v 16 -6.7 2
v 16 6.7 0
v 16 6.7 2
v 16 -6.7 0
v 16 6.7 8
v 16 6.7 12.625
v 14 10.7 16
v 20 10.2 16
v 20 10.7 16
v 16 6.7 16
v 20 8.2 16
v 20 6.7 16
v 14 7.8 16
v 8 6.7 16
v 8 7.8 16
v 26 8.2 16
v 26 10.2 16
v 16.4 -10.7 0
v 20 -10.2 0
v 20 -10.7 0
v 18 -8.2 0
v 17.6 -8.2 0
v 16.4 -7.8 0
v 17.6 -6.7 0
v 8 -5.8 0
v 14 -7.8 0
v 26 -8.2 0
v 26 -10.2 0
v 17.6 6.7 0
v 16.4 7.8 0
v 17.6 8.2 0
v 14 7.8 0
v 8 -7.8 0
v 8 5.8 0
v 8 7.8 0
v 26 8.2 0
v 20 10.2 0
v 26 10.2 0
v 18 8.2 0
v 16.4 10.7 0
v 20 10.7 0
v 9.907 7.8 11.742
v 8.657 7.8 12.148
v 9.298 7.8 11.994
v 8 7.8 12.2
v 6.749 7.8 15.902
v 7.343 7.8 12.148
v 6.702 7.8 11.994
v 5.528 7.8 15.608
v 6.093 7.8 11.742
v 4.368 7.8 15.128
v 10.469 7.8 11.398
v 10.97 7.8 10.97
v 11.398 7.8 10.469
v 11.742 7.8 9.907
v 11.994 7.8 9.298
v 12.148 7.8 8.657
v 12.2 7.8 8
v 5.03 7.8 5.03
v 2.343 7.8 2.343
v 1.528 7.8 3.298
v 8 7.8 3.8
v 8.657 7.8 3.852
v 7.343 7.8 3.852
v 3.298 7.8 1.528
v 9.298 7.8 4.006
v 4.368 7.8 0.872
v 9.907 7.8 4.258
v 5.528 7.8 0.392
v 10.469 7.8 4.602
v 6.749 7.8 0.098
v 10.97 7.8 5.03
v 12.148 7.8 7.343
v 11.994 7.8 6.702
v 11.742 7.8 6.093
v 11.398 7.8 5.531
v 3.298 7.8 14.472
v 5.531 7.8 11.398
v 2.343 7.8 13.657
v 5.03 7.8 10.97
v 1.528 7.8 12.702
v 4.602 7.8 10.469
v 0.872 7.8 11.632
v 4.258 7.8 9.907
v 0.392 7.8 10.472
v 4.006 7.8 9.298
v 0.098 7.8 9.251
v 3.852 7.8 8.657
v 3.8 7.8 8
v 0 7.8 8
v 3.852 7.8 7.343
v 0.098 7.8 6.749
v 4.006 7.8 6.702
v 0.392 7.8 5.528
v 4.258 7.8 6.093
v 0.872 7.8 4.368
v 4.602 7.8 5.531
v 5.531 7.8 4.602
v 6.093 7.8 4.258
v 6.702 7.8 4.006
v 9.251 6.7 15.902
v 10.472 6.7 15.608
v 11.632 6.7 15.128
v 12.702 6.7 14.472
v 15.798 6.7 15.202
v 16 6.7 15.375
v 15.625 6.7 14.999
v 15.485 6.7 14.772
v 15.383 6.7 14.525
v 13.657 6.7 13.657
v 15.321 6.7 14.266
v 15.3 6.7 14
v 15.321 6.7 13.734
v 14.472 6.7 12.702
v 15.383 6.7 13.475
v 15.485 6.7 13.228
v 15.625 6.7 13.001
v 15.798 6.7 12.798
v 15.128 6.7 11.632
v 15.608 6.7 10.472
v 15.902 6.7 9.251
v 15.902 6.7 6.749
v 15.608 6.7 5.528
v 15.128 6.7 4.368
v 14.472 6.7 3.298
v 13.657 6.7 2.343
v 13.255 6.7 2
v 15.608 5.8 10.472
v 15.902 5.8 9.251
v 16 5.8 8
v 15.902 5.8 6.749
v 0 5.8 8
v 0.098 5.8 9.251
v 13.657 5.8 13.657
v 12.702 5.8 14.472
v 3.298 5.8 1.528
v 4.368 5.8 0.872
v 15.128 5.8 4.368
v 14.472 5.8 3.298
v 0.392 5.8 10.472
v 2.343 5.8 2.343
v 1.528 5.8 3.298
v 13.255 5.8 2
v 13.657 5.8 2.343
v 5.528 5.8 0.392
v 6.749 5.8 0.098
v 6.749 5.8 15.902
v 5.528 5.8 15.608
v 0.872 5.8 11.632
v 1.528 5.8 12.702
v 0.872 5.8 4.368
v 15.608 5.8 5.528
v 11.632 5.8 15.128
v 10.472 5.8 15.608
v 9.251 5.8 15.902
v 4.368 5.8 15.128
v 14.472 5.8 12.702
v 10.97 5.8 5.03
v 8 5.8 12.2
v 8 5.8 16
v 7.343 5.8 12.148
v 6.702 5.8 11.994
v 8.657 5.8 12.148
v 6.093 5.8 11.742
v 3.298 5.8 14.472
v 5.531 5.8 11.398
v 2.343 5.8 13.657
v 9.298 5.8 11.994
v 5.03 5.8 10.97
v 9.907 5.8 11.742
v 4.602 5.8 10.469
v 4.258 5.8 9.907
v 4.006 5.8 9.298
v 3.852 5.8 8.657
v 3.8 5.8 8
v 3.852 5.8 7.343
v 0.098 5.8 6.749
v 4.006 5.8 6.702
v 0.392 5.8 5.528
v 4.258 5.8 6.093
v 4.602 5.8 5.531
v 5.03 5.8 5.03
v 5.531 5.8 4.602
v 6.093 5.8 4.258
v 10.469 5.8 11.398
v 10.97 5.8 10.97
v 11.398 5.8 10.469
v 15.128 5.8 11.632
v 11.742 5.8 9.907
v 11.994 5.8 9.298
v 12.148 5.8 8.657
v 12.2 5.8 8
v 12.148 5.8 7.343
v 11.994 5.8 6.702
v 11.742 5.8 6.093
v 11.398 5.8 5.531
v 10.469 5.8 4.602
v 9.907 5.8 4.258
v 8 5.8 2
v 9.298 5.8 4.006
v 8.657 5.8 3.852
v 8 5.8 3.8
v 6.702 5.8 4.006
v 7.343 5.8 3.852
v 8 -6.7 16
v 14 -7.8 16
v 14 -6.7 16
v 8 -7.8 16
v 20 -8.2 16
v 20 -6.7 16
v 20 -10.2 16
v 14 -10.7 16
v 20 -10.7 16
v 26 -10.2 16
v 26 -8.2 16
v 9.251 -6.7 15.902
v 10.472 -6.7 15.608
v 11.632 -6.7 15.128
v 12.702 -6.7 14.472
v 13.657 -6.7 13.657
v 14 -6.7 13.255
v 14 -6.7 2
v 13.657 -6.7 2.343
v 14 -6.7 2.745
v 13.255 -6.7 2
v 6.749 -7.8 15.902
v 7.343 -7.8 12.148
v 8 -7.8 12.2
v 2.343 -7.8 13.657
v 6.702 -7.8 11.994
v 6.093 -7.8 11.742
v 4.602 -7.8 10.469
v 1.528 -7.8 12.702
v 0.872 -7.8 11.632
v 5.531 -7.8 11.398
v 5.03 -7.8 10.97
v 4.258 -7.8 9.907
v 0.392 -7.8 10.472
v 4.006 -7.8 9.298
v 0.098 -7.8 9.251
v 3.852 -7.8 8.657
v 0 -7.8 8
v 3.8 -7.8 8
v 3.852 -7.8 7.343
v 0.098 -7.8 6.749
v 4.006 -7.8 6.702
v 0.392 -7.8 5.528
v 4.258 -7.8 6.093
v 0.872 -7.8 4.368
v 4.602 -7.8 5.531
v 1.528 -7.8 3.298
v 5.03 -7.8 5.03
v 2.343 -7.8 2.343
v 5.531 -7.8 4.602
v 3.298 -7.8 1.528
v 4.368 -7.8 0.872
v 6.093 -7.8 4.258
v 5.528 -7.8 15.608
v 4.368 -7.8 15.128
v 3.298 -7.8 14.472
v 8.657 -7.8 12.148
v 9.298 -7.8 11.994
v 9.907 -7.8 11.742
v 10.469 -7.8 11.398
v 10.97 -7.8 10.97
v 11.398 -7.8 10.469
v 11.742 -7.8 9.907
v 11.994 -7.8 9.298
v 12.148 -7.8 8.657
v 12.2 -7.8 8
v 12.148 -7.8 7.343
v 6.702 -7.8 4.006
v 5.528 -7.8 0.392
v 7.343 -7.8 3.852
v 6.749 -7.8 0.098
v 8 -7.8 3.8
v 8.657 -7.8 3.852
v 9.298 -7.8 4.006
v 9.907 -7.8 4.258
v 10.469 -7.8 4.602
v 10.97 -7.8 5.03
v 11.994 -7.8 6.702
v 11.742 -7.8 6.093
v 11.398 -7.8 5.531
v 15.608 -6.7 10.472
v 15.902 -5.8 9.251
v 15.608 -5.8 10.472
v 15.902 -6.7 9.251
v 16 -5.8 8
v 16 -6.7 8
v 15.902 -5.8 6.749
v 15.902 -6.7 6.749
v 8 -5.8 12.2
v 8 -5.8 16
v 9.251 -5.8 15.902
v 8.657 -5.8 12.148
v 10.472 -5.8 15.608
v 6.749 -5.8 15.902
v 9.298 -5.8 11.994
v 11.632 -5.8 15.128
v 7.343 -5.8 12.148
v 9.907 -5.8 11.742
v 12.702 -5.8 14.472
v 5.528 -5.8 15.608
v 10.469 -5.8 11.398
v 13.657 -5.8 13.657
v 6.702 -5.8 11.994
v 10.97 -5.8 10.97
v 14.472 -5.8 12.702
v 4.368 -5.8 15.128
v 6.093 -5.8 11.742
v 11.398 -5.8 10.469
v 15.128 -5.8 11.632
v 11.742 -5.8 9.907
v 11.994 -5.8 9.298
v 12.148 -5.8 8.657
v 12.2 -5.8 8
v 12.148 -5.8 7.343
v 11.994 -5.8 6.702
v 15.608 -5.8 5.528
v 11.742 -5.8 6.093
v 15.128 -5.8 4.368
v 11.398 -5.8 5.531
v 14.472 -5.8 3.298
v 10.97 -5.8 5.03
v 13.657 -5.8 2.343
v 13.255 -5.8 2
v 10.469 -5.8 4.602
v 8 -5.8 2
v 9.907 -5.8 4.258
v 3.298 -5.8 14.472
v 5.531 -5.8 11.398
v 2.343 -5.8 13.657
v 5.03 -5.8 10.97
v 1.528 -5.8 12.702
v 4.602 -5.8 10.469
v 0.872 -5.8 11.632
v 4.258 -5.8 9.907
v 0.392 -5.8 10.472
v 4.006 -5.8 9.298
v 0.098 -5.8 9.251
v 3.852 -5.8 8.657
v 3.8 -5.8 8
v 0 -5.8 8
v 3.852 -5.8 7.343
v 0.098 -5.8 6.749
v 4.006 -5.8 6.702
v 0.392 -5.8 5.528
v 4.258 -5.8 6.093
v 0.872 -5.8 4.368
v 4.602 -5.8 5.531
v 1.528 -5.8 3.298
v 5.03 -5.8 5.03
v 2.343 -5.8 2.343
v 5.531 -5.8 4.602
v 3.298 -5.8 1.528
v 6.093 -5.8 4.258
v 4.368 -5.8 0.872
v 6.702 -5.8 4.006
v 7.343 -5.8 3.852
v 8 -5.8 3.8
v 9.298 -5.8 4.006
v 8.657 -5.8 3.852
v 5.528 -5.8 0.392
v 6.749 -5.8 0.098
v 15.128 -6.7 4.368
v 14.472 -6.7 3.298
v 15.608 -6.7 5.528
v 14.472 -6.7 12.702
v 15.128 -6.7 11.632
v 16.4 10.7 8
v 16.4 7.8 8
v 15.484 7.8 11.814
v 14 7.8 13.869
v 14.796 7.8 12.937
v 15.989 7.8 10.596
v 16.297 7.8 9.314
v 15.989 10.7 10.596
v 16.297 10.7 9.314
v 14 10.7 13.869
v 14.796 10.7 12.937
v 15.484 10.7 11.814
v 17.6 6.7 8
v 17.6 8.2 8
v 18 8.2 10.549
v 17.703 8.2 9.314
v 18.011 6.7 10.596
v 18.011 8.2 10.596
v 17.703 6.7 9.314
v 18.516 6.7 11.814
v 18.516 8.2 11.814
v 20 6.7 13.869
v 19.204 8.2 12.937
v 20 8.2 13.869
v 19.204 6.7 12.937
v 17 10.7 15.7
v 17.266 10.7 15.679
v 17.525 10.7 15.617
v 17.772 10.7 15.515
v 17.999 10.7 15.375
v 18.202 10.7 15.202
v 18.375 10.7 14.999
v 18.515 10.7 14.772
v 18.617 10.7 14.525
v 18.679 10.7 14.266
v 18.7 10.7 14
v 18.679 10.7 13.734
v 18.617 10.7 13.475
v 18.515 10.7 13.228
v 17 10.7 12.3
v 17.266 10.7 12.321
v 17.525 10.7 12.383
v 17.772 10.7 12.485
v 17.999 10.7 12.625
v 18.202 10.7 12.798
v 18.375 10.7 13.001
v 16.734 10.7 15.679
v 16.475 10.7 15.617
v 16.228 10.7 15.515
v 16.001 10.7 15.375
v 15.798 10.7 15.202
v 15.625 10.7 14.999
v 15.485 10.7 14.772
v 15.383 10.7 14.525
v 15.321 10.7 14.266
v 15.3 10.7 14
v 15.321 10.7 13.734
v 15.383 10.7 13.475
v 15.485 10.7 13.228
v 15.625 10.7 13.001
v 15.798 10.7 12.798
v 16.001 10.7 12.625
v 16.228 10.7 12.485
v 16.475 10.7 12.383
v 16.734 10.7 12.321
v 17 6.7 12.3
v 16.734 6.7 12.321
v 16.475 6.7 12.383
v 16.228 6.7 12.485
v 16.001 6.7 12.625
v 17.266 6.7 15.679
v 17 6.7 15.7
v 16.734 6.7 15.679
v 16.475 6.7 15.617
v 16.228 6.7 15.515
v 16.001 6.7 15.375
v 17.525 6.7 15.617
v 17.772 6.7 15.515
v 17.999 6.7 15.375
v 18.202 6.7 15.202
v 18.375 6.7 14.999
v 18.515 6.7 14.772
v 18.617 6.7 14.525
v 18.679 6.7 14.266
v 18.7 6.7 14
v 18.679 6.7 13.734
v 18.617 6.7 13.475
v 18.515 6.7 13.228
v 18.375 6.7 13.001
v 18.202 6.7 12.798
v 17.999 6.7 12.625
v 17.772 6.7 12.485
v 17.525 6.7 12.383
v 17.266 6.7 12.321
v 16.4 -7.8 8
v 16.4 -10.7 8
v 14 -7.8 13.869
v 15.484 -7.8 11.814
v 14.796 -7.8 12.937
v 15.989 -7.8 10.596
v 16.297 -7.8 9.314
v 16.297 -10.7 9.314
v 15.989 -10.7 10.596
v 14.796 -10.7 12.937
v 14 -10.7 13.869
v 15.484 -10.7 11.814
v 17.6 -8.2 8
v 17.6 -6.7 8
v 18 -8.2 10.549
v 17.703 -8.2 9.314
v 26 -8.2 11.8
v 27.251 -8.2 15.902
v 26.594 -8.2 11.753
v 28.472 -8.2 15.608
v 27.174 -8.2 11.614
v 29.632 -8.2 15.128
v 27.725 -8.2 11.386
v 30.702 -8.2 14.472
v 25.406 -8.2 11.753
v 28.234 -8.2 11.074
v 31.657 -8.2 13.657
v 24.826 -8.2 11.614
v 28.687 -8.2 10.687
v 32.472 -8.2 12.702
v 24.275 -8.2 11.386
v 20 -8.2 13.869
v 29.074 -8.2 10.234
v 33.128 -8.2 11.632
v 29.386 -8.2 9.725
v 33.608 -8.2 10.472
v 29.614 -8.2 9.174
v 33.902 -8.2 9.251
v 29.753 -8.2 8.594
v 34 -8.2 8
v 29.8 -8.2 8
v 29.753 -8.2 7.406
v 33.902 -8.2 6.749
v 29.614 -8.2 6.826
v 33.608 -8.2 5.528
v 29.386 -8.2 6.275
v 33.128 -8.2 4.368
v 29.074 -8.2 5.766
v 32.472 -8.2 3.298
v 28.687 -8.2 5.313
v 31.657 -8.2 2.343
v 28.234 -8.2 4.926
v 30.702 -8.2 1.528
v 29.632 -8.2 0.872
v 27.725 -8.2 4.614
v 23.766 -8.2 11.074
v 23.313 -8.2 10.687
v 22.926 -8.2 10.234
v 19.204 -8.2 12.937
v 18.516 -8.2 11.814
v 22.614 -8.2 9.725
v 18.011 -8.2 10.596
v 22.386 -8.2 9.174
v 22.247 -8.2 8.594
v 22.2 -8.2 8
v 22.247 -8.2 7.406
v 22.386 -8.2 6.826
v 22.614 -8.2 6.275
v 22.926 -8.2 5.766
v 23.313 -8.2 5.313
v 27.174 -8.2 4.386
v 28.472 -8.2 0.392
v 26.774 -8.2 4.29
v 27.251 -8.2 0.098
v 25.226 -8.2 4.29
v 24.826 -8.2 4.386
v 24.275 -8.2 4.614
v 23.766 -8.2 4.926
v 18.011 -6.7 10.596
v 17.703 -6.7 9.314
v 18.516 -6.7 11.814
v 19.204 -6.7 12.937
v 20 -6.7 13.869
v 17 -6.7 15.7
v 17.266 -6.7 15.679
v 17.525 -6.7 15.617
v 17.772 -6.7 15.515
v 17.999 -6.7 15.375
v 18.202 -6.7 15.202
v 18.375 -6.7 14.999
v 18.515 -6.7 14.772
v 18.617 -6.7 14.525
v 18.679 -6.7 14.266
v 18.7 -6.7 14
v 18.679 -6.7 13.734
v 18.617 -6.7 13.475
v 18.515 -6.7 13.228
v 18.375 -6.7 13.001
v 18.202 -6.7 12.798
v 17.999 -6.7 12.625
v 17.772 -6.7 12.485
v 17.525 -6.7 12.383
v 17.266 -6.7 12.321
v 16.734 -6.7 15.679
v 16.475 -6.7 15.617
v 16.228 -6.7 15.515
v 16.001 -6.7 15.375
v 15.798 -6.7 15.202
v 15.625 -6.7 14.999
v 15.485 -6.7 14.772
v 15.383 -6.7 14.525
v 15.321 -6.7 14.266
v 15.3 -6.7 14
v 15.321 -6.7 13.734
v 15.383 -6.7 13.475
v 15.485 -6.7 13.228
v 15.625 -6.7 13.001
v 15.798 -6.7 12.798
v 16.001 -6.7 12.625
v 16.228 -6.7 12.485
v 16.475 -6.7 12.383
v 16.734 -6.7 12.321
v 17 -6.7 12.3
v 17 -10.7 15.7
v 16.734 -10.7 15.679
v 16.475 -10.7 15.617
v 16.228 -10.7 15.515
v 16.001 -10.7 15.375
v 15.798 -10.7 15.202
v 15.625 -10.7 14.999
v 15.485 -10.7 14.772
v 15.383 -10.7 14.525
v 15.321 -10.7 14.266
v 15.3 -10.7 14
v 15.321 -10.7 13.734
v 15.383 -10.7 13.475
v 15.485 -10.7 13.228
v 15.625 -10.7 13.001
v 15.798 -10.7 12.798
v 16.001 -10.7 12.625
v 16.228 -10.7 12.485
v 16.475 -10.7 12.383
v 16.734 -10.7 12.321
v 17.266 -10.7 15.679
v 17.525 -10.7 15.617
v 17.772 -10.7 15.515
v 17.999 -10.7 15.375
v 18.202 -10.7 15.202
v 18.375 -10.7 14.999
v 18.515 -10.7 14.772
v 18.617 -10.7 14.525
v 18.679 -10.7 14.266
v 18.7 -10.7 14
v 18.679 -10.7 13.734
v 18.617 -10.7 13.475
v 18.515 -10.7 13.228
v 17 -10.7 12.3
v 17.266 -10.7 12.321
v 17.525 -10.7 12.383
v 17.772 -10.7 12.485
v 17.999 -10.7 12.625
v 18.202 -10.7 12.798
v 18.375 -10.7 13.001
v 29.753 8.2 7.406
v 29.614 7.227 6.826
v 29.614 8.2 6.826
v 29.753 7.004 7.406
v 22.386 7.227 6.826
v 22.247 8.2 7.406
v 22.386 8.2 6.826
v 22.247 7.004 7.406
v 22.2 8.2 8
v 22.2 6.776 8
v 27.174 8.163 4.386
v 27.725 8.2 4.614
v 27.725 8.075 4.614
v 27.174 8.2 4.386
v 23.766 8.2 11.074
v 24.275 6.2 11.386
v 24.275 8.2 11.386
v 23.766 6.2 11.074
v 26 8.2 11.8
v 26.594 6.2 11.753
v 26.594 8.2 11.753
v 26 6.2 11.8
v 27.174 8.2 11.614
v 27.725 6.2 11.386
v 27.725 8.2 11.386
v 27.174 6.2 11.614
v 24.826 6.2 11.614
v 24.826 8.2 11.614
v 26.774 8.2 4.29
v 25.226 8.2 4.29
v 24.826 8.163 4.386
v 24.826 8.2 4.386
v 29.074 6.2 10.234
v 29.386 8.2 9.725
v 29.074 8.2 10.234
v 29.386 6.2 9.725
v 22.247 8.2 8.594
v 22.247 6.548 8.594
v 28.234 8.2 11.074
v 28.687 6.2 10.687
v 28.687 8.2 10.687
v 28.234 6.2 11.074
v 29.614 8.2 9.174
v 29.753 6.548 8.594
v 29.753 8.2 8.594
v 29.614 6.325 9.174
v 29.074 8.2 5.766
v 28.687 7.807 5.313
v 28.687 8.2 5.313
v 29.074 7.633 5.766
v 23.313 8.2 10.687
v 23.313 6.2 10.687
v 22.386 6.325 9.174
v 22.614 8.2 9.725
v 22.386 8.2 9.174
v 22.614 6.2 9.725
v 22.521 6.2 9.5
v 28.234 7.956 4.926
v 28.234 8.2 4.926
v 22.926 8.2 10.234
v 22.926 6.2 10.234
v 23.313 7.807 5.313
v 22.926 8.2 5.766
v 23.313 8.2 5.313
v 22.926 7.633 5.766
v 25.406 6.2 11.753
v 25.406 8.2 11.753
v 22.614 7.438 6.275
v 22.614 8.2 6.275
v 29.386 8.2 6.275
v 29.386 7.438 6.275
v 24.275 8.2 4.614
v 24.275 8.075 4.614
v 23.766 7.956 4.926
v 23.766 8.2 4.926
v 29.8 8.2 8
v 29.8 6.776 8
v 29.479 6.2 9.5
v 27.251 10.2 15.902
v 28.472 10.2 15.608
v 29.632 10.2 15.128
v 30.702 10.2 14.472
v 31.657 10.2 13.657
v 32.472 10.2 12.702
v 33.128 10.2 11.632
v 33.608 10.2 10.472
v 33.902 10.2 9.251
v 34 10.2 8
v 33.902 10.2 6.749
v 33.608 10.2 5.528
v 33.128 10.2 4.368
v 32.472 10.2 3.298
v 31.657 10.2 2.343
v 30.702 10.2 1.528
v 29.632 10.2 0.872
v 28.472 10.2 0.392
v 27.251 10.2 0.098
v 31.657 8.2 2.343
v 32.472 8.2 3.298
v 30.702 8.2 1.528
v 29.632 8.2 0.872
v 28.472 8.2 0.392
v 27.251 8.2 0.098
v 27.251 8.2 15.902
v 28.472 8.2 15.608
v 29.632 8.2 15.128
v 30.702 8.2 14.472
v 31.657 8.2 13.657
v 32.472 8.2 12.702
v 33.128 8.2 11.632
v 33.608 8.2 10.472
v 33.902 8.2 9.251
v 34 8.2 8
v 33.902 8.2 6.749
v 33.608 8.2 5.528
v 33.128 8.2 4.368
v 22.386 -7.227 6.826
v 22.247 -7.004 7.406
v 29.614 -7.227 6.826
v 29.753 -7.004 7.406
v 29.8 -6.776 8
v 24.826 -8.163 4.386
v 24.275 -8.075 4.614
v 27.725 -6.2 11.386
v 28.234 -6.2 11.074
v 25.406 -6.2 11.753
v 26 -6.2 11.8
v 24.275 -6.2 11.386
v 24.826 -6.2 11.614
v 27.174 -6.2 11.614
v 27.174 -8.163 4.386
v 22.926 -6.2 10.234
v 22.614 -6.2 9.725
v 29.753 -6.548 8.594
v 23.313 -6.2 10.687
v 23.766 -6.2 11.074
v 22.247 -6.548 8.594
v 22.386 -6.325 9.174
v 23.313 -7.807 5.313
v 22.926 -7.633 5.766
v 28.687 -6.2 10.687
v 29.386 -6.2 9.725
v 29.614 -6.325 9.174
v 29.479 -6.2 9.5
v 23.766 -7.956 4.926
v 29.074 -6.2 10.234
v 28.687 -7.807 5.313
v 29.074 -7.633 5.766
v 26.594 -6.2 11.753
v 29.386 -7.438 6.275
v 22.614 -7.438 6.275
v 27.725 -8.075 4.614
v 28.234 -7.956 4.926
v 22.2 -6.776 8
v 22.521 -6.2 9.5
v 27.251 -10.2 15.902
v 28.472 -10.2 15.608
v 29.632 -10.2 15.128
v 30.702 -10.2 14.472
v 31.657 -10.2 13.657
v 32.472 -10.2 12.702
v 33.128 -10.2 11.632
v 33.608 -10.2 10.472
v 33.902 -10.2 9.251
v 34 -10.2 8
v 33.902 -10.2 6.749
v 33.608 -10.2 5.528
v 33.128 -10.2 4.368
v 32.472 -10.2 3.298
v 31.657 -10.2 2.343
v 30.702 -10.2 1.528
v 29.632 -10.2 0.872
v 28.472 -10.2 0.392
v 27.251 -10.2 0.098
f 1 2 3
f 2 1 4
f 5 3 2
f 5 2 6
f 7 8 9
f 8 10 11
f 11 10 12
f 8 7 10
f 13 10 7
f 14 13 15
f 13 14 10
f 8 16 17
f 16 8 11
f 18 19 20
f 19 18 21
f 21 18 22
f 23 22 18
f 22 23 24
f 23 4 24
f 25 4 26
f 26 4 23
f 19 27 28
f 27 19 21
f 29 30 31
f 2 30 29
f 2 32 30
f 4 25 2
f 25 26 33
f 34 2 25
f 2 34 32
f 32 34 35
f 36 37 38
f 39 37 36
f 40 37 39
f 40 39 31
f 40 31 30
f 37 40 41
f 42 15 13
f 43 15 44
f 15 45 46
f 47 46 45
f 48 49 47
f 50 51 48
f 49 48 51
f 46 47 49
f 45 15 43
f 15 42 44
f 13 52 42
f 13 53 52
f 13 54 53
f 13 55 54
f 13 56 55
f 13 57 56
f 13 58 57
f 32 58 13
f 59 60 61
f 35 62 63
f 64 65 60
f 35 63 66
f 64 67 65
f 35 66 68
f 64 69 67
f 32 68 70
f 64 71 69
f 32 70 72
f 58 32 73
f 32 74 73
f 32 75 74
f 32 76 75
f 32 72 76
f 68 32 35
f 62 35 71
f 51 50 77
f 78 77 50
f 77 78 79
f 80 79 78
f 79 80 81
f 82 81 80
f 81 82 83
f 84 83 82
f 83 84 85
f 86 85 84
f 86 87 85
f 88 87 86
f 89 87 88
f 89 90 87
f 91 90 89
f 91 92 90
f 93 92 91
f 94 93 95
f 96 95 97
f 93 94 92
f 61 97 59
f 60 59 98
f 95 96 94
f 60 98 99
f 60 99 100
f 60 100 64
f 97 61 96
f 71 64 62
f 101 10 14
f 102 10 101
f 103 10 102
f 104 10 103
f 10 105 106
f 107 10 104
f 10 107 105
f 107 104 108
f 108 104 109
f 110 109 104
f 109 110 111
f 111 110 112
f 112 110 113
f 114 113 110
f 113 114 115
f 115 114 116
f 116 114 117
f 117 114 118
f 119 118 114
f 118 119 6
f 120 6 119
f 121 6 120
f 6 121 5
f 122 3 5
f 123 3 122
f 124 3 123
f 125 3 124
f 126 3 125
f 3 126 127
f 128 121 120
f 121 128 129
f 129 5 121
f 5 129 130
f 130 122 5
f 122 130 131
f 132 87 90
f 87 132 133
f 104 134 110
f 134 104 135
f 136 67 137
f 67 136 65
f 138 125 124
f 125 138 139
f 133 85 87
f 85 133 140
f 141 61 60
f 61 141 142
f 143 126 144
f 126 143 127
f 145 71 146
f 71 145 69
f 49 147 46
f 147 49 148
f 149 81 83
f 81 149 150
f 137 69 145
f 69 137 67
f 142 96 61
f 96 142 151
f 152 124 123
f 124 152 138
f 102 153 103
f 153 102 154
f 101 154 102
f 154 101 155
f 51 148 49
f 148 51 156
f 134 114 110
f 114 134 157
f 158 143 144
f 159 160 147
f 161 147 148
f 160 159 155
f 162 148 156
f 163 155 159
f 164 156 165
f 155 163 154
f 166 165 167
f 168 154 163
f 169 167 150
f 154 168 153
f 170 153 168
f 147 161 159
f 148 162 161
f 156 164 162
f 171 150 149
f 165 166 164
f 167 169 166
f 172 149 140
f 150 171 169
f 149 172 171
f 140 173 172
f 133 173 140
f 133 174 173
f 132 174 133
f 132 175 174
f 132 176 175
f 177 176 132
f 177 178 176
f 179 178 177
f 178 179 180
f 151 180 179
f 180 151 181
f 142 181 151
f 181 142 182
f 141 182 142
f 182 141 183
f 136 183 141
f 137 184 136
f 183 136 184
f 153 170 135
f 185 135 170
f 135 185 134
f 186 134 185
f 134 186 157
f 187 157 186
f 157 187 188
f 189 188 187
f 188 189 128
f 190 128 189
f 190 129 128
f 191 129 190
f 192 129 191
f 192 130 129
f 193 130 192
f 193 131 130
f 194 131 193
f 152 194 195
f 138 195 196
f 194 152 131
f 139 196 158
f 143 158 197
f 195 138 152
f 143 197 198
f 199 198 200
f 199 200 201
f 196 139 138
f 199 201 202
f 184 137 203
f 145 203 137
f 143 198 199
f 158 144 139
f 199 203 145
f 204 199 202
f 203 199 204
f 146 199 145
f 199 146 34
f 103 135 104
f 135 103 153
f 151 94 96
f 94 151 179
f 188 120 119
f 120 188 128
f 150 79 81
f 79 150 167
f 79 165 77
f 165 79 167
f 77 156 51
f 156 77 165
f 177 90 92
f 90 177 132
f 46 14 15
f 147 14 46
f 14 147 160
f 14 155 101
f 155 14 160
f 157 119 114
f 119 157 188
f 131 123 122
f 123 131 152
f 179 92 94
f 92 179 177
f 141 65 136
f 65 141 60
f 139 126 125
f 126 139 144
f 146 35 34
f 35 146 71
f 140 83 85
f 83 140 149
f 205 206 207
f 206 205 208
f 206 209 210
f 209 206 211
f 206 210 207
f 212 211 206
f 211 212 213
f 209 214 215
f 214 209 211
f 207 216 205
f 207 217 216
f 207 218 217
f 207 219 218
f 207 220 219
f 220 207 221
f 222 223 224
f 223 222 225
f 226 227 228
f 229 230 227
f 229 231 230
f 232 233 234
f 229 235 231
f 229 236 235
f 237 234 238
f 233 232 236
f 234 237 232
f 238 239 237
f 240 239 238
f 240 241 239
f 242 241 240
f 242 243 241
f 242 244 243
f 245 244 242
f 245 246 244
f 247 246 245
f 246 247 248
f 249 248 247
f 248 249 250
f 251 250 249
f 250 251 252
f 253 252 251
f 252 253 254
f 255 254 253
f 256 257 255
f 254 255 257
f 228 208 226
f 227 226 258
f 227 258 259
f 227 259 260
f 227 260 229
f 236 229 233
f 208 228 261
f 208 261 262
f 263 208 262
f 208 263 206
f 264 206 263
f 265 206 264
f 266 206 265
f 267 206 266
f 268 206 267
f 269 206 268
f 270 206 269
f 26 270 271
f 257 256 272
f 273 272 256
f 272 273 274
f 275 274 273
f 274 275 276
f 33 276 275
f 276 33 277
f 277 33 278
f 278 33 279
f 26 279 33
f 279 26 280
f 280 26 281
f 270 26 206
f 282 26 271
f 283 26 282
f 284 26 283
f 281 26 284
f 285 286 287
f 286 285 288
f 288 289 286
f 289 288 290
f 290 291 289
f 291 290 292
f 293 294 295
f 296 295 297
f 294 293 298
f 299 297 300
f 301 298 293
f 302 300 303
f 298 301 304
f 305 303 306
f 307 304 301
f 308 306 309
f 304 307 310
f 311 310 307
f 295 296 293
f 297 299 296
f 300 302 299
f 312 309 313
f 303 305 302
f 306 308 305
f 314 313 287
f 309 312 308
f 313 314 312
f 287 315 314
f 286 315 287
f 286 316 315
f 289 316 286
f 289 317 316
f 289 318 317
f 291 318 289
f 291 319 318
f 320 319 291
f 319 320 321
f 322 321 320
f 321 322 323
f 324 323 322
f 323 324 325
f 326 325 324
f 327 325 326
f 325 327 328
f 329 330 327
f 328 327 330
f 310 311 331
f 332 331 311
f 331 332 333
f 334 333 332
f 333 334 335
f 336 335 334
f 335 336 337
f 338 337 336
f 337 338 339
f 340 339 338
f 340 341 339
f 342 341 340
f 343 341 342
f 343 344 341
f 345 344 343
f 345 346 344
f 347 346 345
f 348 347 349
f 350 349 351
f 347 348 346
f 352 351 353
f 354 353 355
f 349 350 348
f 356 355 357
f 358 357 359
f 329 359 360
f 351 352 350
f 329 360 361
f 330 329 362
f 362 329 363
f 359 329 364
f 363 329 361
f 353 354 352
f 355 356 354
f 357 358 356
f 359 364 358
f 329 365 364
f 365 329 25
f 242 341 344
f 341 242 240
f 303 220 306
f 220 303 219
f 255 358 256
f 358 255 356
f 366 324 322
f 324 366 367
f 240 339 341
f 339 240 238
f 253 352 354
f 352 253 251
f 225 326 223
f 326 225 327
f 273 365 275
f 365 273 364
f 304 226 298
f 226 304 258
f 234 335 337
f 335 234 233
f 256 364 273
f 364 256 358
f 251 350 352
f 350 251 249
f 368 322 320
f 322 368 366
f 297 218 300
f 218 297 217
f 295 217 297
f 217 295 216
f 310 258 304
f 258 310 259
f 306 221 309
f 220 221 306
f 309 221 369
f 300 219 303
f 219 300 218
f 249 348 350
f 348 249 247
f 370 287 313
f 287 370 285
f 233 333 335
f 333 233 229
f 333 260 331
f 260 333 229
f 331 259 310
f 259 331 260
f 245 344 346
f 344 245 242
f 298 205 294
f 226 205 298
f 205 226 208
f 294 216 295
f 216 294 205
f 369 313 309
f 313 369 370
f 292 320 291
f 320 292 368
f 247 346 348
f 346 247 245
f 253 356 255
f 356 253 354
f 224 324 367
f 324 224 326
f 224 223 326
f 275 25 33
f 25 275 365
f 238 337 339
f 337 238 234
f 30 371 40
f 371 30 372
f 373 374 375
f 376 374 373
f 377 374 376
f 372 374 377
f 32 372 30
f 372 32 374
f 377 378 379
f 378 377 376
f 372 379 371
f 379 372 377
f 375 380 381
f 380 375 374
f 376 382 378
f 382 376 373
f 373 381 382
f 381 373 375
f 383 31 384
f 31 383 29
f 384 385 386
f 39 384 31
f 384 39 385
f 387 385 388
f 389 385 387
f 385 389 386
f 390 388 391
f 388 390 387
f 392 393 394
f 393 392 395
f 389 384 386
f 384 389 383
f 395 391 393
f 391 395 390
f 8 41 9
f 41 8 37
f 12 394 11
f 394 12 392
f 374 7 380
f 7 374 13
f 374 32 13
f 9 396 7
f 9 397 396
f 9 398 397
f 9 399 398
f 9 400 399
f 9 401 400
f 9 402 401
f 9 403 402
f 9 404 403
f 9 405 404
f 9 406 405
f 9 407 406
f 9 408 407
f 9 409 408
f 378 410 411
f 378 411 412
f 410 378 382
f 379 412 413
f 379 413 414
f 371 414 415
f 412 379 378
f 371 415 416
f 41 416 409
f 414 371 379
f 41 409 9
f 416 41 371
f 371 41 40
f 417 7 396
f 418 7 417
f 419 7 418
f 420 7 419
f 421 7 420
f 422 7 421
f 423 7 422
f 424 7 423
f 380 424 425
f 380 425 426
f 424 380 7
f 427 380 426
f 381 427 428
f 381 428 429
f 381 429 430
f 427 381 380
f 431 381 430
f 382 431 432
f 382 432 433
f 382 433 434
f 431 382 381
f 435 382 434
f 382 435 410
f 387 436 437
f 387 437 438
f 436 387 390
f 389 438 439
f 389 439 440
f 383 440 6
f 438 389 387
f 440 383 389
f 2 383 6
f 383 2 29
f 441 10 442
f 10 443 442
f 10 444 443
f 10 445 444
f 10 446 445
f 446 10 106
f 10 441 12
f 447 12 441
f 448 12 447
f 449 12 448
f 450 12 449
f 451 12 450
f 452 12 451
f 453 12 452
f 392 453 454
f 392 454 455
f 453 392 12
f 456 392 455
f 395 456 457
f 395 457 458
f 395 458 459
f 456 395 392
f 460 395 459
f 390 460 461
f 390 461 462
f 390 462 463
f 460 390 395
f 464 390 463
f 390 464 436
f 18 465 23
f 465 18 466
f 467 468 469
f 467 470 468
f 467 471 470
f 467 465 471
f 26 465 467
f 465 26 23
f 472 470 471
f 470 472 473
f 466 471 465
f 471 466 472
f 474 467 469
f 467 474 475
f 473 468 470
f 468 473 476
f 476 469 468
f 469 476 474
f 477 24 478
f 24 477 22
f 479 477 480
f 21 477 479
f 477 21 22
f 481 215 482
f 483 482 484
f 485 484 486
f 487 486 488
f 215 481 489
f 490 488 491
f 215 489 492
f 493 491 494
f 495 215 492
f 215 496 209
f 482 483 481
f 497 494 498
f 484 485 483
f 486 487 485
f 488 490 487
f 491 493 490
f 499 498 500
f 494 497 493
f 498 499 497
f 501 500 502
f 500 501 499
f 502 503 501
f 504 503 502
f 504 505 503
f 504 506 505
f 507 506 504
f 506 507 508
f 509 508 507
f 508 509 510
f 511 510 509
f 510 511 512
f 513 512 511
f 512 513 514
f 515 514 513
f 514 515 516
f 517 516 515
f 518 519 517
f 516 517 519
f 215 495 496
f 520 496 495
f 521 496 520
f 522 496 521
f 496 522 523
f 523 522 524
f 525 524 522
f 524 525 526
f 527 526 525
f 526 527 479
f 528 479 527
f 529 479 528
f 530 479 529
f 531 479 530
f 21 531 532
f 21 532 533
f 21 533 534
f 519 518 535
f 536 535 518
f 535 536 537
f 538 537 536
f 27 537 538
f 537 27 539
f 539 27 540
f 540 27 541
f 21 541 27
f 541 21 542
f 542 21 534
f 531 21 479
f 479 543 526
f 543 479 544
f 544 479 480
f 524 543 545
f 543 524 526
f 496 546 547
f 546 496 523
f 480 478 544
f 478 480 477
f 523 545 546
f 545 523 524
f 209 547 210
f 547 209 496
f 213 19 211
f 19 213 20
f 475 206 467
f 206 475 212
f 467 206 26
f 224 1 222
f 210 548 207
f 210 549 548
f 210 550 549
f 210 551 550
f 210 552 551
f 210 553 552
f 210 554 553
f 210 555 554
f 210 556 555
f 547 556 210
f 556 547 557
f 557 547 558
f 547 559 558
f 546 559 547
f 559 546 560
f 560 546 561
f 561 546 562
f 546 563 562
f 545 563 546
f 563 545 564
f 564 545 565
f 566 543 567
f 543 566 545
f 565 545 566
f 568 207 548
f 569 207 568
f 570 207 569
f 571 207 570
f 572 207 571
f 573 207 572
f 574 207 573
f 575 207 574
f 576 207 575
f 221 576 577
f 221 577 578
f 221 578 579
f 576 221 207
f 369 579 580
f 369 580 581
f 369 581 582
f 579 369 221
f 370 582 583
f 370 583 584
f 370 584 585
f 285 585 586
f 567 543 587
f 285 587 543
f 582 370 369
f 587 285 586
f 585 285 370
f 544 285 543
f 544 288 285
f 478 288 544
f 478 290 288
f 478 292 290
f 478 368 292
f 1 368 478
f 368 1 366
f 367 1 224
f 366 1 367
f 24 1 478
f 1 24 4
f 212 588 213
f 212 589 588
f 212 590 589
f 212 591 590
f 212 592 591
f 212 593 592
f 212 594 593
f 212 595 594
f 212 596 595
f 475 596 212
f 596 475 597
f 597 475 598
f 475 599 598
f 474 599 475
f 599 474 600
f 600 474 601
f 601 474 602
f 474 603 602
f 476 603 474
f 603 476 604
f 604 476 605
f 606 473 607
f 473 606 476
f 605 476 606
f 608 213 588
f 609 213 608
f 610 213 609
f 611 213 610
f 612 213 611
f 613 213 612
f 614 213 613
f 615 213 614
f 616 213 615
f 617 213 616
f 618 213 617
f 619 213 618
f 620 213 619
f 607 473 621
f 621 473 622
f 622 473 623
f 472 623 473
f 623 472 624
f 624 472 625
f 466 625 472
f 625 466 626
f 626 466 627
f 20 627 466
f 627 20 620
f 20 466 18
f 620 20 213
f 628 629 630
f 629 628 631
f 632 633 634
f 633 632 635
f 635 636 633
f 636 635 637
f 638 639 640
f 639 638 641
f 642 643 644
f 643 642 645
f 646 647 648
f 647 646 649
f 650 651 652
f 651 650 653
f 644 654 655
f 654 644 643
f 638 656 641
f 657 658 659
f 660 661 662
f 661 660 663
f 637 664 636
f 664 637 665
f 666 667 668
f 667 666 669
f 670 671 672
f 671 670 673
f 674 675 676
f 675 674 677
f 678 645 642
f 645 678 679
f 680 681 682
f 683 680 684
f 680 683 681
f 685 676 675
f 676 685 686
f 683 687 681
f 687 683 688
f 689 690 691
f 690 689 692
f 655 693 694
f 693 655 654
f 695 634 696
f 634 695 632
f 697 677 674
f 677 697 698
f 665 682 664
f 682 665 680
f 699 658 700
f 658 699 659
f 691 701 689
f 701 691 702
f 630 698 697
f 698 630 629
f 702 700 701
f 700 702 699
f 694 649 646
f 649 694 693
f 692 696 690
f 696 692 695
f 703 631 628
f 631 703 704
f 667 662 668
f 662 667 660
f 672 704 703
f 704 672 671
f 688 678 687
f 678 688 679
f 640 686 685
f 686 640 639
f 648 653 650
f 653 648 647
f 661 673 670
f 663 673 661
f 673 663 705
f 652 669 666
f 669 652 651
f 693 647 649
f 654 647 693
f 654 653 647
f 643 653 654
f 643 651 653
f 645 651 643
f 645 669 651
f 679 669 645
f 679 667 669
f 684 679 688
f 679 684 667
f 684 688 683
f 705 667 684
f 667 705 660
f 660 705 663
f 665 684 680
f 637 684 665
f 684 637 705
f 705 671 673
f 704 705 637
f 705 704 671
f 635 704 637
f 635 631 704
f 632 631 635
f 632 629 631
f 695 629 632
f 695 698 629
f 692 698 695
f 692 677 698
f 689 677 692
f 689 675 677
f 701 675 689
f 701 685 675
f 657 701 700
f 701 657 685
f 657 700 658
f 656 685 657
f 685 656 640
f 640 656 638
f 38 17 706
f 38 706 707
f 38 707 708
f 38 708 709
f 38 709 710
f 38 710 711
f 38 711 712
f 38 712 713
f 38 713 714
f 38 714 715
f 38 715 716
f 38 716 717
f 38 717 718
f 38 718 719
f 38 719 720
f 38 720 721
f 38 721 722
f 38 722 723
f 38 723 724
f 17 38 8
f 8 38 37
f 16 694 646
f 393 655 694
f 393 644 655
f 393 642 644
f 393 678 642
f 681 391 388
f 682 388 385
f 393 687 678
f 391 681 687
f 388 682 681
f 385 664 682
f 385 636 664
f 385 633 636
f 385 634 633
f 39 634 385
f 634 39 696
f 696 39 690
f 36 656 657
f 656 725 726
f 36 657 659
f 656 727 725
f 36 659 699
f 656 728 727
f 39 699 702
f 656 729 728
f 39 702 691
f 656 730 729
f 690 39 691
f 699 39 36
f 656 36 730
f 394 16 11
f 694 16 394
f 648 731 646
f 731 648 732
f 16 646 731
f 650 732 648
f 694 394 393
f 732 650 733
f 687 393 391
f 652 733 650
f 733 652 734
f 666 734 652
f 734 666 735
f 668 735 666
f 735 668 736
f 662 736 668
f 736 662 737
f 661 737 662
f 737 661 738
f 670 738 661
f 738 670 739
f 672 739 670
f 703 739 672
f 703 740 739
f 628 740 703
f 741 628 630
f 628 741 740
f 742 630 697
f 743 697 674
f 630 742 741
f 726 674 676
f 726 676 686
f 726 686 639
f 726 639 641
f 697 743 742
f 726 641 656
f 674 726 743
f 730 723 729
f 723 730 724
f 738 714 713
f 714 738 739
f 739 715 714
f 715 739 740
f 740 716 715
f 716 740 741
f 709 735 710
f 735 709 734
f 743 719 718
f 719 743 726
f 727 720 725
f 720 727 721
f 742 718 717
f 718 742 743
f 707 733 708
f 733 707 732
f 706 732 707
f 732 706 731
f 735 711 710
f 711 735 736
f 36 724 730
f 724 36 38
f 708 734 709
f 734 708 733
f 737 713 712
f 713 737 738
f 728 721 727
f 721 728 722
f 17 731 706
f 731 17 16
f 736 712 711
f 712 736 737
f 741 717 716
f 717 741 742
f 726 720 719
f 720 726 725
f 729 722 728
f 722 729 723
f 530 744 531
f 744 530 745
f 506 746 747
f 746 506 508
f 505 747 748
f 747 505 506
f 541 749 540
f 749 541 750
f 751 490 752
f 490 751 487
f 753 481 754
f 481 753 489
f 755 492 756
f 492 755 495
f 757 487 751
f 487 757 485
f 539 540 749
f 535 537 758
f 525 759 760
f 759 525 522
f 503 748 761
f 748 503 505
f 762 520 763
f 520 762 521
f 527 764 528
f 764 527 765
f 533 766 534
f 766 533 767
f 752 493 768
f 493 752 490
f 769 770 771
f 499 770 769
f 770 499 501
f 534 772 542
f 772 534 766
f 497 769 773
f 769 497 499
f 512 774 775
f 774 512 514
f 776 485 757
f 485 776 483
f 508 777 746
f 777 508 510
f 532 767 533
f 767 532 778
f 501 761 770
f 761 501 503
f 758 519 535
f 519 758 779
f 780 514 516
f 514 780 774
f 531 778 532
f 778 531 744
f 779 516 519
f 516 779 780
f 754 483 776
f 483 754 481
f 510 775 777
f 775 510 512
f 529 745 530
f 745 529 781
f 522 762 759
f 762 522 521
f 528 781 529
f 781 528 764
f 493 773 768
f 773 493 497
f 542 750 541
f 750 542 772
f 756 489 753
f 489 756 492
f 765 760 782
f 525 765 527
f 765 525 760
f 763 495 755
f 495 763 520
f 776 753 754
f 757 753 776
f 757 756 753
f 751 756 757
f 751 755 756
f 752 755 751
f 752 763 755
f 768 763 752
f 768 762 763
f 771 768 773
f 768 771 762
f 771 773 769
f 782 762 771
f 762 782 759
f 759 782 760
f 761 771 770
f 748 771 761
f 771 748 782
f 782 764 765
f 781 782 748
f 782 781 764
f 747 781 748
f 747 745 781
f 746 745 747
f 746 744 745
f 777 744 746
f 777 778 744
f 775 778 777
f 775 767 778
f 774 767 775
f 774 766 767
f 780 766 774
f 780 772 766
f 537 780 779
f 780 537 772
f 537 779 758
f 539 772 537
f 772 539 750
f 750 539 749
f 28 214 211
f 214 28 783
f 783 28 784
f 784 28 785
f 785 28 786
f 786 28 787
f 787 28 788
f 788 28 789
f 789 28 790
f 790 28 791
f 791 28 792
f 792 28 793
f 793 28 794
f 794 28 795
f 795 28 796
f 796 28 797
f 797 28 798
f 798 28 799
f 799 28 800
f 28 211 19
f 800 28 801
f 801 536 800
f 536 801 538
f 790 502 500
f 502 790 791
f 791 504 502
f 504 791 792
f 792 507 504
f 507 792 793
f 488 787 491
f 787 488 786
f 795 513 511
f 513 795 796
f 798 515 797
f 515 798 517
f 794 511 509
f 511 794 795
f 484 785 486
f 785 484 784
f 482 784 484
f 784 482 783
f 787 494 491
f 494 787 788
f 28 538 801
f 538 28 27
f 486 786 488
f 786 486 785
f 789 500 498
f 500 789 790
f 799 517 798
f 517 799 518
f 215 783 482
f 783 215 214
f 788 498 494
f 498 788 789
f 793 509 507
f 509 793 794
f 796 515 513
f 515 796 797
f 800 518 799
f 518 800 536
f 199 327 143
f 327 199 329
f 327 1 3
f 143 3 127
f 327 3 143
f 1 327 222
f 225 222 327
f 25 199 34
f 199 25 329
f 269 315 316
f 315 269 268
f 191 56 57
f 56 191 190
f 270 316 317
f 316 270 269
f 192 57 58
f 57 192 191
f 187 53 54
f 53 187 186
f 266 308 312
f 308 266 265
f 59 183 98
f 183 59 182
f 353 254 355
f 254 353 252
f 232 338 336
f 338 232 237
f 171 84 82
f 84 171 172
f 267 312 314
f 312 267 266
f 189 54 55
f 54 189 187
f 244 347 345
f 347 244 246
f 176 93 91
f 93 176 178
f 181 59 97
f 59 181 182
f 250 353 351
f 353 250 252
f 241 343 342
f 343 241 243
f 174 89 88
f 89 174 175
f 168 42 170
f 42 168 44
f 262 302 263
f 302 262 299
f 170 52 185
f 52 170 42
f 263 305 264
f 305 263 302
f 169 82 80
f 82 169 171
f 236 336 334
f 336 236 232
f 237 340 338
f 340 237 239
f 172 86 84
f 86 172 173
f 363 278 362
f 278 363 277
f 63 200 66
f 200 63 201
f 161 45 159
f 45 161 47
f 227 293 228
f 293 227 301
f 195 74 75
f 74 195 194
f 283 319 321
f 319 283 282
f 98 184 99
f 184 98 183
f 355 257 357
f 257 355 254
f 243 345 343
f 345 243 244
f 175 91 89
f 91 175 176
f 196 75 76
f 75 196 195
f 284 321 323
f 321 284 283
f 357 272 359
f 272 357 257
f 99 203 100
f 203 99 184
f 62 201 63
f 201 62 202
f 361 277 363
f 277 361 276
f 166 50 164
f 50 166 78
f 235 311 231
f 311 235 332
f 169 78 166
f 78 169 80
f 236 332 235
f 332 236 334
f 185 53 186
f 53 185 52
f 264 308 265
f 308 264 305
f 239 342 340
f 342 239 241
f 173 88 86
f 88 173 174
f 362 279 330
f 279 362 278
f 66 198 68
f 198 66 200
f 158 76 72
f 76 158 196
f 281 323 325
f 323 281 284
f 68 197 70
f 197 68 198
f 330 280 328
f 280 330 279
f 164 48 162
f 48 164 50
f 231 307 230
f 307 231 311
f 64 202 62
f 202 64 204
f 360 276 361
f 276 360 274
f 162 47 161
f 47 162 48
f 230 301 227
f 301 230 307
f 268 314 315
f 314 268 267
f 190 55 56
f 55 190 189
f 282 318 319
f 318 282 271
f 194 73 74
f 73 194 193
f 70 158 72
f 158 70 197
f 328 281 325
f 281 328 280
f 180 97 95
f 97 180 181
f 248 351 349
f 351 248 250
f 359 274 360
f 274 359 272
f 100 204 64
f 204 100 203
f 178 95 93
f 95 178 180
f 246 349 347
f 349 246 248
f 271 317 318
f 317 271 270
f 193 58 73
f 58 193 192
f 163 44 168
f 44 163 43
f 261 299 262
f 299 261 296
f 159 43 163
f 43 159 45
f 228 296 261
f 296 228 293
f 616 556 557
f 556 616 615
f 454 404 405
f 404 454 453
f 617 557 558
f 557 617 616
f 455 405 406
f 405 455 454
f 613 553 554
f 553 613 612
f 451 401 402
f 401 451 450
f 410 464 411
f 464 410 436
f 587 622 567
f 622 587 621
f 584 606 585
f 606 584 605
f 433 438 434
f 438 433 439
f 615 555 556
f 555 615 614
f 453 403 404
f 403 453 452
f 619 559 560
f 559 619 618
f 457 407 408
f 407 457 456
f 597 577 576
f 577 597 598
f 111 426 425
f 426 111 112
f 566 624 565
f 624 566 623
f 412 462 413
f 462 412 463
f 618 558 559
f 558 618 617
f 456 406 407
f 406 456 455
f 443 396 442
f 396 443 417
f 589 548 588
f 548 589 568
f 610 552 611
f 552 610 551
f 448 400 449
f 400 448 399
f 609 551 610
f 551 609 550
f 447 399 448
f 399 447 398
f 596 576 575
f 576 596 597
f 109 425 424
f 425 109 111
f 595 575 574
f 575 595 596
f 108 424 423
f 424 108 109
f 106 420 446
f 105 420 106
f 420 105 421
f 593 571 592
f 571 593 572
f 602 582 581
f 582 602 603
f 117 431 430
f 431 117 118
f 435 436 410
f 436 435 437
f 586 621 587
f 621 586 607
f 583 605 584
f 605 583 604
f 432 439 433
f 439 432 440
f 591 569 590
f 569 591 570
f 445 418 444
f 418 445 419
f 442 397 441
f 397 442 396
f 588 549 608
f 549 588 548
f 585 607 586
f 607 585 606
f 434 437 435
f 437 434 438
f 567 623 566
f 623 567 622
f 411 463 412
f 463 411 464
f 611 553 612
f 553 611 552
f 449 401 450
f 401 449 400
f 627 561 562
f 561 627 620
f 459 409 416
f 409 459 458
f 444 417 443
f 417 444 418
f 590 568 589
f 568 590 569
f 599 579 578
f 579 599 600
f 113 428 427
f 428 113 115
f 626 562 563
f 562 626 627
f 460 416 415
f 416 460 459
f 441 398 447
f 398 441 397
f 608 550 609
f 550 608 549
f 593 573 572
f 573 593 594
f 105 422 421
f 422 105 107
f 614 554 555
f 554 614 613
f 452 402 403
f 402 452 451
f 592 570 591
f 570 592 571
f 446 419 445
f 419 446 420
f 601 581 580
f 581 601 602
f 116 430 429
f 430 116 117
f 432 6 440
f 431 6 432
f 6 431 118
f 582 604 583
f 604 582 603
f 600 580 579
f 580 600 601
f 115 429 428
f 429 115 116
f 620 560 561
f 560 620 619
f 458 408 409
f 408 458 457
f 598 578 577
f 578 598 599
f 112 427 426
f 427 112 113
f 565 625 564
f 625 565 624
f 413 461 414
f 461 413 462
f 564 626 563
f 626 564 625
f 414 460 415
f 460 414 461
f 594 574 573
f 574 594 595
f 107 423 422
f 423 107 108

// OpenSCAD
play=0.2;
$fn=40;
width=12;
round="yes"; //[yes,no]

module cablechain(w=12,round=true)
{
    difference()
    {
        union()
        {
            //base with hole
            d=round?8:0;
            translate([d,-(w+4-2*play)/2,0])
                cube([16-d,w+4-2*play,2]);
            for(dy=[1,-1])
            translate([0,-1+dy*(w+4-2-2*play)/2,0])
            {
                if(round==false)
                    cube([16,2,8]);
                translate([16-8,-1/2-play/4+1+dy*(1-play/2)/2,0])
                    cube([8,1+play/2,16]);
                translate([16/2,2,8])
                rotate([90,0,0])
                    cylinder(h=2,r=16/2);
            }
            
            //middel part
            for(dy=[1,-1])
            difference()
            {
                union()
                {
                    translate([16-2,-4/2+dy*(w+8-3+2*play)/2,0])
                        cube([6,4,16]);
                }            
                translate([0,-4/2+dy*(w+4+4-2*play)/2,0])
                {
                    translate([-2*play,0,-1])
                        cube([16+4*play,4,9]);
                    translate([16/2,4,8])
                    rotate([90,0,0])
                        cylinder(h=4,r=16/2+2*play);
                }
                translate([18,-1+dy*(w+8-6+2*play)/2,0])
                {
                    translate([-2*play,0,-1])
                        cube([16+4*play,2,8+1]);
                    translate([16/2,2,8])
                    rotate([90,0,0])
                        cylinder(h=2,r=16/2+2*play);
                }
            }                

            //side with snap
            for(dy=[1,-1])
            translate([18,-1+dy*(w+8-2+2*play)/2,0])
            {
                if(round==false)
                    cube([16,2,8]);
                translate([0,0,0])
                    cube([8,2,16]);
                translate([16/2,2,8])
                rotate([90,0,0])
                    cylinder(h=2,r=16/2);
                
                translate([16/2,1,8])
                rotate([dy*90,90+dy*90,0])
                difference()
                {
                    cylinder(h=3,r=8/2-play);
                    translate([-4,-1.5,3])
                    rotate([-21,0,0]) 
                        cube([8-play,8-play,3]);                
                }
            }
            
        }
        
        
        translate([16/2,0,8])
        rotate([90,0,0])
            cylinder(h=w+4+2,r=8/2+play,center=true);
        
        translate([17,0,14])
        rotate([90,0,0])
            cylinder(h=w+12,r=3/2+play,center=true);
        
    }
    
}

translate([-18,0,0])
    %cablechain(width,round=="yes");
cablechain(width,round=="yes");
translate([18,0,0])
    %cablechain(width,round=="yes");

